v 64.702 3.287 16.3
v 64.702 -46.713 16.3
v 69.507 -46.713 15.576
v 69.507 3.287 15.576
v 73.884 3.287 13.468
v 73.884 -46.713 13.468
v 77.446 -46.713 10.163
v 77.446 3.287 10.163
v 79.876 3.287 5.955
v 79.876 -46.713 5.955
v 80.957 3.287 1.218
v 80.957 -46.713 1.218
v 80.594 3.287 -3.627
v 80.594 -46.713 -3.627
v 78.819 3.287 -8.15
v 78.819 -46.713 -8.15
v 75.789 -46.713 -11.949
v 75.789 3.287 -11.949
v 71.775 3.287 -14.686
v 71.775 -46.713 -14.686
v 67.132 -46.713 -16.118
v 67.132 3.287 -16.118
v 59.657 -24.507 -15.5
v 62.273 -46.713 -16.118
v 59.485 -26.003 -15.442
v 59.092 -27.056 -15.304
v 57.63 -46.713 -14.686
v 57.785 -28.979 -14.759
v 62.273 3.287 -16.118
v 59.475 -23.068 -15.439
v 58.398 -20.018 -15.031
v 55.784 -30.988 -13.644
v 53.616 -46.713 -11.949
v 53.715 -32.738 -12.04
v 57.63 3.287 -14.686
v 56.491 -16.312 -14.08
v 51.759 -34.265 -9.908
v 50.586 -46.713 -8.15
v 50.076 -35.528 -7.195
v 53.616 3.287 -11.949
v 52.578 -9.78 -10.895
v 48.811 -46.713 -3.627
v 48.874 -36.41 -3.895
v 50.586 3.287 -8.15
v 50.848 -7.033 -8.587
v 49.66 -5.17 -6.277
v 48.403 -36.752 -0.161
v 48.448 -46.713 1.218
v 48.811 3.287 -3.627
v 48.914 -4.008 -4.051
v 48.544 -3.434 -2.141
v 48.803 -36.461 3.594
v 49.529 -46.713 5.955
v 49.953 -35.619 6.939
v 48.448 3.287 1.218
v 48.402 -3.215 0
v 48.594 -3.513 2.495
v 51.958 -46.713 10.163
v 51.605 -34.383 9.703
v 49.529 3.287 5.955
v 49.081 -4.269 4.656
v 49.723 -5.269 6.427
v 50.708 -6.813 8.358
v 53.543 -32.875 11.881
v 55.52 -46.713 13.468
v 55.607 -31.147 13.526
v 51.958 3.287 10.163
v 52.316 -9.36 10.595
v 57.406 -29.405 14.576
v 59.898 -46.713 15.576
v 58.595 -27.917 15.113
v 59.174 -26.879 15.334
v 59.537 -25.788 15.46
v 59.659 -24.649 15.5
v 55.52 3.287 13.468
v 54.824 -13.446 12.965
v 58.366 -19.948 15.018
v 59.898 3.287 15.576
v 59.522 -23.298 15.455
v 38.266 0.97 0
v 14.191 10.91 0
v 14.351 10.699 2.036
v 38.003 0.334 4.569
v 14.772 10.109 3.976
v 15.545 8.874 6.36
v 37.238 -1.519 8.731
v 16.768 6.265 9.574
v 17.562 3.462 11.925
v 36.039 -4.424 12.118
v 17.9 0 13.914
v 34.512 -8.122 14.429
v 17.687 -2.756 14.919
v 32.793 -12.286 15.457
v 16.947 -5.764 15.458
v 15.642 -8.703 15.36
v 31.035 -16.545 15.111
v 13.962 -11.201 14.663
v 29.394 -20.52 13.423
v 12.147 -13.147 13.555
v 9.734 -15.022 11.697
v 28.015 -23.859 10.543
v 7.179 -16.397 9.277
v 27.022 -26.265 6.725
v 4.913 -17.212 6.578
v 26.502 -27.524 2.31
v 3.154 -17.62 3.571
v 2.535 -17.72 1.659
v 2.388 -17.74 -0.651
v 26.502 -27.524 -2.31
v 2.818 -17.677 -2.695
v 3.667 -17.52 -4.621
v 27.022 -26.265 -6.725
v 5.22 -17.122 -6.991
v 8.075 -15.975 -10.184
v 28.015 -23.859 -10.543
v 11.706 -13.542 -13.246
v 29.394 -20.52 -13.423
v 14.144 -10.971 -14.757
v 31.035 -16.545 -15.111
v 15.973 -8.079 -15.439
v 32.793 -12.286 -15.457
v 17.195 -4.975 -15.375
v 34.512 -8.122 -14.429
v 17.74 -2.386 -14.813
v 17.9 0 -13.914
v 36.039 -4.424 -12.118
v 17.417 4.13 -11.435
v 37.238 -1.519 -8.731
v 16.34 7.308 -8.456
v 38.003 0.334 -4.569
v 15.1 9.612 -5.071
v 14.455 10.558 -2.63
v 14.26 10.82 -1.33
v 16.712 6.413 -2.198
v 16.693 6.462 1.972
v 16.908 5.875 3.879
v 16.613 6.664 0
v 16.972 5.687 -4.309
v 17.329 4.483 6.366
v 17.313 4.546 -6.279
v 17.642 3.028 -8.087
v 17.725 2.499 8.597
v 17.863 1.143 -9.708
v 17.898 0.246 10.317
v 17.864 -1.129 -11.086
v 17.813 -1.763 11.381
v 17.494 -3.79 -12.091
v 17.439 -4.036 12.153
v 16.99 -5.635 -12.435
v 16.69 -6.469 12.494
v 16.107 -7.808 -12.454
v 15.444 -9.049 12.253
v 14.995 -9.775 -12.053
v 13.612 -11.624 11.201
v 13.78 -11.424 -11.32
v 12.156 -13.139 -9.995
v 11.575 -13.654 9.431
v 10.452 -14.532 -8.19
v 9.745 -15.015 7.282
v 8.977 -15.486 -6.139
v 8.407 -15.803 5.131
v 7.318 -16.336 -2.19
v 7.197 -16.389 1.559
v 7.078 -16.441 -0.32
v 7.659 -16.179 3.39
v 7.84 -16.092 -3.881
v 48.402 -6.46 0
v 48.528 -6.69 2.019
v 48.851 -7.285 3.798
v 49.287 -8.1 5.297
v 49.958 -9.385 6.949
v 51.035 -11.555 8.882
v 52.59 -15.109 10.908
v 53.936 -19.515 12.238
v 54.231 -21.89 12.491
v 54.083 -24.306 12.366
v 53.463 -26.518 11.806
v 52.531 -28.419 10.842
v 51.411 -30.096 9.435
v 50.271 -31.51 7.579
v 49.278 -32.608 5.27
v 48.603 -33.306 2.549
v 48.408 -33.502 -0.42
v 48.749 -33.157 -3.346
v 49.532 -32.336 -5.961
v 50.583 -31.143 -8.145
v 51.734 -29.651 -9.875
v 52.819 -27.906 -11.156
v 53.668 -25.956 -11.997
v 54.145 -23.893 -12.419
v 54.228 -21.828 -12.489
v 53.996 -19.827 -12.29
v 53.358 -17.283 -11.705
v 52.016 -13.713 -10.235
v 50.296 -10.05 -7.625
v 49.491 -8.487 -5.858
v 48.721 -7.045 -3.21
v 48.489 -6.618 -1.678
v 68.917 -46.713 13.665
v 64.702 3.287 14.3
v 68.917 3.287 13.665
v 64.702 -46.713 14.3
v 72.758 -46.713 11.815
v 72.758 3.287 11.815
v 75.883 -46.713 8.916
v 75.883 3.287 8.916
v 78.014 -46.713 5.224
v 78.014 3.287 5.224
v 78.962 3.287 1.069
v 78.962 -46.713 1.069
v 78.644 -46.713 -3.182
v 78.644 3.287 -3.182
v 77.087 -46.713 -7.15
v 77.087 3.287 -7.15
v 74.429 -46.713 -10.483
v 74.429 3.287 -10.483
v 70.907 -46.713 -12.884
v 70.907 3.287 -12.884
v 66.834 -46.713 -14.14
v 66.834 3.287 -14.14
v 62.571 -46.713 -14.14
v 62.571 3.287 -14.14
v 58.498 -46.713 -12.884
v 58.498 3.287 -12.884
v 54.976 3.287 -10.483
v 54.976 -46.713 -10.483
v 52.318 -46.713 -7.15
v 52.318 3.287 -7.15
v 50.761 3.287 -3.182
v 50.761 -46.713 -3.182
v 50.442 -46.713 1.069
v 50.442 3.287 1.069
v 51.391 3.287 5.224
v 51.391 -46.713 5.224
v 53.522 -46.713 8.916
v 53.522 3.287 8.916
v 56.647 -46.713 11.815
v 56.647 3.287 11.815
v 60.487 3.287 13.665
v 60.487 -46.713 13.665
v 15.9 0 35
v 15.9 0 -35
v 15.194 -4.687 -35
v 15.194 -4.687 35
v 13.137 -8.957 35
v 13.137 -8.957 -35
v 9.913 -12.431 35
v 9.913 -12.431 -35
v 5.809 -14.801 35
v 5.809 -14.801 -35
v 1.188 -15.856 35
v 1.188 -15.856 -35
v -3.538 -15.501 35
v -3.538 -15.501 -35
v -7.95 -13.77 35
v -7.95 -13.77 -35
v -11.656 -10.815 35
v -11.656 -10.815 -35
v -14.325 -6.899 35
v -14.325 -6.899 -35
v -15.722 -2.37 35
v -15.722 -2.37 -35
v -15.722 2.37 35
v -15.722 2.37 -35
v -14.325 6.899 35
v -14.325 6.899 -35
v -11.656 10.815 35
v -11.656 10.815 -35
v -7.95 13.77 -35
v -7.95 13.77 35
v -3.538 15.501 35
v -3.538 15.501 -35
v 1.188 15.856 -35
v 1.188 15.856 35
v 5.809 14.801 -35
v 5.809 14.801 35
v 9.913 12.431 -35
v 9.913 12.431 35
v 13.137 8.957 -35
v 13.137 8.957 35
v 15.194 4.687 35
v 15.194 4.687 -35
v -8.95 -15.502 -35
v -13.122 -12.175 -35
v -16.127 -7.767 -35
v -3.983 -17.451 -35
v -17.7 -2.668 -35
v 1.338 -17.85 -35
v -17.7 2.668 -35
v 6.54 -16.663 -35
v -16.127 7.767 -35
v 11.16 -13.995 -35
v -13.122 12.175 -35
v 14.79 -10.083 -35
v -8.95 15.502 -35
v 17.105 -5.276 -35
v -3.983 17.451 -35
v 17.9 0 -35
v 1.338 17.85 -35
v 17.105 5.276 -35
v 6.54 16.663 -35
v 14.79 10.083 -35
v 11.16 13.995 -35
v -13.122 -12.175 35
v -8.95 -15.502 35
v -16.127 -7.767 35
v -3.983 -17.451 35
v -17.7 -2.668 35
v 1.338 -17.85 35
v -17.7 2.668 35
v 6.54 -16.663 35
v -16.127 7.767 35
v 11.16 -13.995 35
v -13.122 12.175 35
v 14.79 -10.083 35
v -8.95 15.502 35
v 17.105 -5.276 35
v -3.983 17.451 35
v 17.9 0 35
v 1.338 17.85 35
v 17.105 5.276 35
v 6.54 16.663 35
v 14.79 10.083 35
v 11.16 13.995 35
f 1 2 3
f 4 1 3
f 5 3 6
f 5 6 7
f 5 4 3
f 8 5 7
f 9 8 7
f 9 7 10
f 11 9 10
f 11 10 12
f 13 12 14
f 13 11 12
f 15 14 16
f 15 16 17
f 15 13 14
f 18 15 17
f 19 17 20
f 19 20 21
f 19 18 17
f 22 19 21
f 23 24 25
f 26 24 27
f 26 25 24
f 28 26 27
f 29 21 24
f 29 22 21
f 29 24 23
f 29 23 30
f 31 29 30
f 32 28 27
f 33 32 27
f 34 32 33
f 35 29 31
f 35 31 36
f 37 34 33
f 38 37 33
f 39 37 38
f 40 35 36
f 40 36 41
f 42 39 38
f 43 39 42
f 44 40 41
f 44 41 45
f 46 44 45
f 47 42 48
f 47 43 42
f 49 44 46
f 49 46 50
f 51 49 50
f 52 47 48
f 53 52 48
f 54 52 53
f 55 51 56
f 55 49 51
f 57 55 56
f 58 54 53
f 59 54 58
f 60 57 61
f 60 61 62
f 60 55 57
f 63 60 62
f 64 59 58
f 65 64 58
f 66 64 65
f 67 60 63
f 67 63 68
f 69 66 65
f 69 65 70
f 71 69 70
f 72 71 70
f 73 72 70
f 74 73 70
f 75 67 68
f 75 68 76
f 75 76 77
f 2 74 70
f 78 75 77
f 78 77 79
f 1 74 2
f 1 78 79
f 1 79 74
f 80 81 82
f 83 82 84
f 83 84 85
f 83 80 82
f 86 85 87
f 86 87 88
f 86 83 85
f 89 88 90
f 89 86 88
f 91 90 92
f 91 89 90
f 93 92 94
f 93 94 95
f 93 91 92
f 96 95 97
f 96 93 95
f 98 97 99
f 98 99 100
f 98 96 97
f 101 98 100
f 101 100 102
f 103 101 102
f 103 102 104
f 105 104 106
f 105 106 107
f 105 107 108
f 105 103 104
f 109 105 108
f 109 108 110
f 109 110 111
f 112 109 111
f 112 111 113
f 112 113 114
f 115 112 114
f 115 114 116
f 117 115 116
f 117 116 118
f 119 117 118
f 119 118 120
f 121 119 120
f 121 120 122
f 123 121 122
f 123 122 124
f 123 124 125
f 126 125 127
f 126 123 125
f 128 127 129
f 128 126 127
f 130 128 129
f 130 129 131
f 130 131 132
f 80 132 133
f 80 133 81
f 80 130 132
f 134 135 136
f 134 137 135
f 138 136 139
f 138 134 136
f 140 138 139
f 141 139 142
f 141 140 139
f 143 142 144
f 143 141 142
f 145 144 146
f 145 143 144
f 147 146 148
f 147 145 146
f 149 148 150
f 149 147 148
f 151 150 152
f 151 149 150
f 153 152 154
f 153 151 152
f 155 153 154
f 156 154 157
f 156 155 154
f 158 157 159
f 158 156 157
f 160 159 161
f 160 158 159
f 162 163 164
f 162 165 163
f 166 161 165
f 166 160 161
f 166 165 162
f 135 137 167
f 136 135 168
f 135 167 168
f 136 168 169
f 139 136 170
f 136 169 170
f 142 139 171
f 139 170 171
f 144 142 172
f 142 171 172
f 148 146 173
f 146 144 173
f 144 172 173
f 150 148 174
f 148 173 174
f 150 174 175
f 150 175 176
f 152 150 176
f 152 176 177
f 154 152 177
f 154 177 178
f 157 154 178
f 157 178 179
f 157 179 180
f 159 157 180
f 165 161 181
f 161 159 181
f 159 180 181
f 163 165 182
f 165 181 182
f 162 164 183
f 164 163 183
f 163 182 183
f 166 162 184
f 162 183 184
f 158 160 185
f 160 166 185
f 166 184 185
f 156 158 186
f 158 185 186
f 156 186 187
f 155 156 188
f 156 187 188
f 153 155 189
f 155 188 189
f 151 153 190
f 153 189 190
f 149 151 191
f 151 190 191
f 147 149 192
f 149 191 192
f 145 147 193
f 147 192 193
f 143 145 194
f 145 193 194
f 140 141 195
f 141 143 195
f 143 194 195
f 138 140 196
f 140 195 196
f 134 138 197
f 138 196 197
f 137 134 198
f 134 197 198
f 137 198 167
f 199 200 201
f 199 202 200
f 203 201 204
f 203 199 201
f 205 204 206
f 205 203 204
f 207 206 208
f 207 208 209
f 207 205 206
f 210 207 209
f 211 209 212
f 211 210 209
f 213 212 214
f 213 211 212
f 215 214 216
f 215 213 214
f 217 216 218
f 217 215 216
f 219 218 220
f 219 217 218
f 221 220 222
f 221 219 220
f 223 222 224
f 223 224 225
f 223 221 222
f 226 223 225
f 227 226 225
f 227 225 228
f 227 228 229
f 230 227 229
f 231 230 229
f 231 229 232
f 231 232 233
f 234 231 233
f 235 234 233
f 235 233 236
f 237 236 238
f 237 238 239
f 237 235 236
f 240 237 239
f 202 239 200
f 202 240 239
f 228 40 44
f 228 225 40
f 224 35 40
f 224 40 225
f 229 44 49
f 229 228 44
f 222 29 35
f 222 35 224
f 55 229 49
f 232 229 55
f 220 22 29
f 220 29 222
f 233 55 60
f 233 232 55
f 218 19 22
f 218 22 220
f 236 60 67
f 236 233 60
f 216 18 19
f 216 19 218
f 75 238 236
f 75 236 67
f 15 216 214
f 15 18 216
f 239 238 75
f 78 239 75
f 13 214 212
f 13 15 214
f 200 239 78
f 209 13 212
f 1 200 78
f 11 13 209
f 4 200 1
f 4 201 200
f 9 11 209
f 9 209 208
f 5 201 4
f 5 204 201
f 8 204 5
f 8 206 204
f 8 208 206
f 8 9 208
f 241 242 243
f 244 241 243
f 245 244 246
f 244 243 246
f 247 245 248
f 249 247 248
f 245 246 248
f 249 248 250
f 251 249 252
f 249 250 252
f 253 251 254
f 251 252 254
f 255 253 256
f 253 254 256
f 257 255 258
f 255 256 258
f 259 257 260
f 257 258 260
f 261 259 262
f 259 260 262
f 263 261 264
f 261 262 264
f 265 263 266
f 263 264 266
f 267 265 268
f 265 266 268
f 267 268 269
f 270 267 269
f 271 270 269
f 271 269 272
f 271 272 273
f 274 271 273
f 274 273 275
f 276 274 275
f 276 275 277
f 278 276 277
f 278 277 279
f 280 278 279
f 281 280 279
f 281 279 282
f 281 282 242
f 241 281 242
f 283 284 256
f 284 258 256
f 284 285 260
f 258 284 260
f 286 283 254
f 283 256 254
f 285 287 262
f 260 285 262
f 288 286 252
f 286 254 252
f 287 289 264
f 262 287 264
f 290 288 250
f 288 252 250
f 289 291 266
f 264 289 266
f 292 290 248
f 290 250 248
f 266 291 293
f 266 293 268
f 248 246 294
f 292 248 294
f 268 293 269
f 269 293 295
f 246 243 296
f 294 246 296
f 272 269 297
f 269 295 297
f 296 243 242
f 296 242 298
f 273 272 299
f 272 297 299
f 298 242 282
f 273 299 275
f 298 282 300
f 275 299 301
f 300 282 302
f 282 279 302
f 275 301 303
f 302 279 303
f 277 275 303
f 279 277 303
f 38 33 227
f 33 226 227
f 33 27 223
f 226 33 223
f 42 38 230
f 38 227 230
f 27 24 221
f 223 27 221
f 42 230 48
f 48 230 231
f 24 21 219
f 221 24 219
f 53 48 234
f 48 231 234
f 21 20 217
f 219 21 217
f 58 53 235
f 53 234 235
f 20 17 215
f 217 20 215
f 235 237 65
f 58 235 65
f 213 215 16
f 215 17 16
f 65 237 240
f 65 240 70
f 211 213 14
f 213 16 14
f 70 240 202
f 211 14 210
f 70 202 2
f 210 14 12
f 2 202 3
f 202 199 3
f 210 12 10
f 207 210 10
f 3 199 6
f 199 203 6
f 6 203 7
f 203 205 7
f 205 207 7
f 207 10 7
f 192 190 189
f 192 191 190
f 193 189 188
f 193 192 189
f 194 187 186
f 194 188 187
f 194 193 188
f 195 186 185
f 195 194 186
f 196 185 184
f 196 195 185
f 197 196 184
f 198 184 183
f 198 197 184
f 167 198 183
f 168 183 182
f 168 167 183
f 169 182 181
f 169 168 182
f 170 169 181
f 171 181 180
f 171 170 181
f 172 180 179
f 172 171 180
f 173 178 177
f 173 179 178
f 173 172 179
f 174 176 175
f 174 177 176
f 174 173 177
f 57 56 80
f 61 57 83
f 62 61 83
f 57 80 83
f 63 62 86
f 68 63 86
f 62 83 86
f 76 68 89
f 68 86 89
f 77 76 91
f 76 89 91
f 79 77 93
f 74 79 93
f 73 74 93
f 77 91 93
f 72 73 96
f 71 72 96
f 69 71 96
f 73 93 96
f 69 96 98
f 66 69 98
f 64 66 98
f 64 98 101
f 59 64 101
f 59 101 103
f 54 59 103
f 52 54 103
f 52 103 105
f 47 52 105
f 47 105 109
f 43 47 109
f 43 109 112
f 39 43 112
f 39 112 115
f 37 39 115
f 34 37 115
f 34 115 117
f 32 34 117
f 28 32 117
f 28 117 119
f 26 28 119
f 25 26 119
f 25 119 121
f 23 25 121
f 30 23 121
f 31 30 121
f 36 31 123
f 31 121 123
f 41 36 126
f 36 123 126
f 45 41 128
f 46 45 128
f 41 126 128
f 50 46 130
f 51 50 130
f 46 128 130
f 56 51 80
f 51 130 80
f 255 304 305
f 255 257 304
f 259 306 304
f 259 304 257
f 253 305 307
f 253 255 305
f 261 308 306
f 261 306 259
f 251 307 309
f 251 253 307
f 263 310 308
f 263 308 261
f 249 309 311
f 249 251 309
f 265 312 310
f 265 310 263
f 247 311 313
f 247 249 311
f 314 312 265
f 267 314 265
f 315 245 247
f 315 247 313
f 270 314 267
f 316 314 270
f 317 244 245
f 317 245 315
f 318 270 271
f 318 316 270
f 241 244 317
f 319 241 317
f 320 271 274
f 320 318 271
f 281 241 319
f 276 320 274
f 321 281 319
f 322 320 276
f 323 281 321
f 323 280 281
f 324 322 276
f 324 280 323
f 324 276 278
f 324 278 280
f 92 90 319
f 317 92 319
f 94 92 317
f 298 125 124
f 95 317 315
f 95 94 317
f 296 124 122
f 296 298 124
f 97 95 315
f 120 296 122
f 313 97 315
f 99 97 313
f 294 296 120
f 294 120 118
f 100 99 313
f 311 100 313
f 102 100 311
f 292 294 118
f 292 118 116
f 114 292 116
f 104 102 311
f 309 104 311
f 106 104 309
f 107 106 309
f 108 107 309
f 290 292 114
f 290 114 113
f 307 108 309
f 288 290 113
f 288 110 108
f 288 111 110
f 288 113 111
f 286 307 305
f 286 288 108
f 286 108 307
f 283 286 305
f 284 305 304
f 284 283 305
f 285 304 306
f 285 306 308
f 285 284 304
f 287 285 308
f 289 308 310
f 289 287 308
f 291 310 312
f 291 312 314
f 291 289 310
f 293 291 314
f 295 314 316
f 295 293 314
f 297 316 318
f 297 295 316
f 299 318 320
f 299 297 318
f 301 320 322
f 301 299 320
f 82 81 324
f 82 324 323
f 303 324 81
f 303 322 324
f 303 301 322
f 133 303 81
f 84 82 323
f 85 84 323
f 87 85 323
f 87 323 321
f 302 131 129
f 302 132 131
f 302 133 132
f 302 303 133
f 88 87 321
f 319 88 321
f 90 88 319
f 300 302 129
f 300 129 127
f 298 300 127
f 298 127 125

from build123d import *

# Parameters (mm, degrees)
ESQUISSE1_R                         = 17.9
ESQUISSE1_R_2                       = 15.9
ESQUISSE5_R                         = 16.3
ESQUISSE5_R_2                       = 14.3
BOSS_EXTRU_1_DEPTH                  = 30
BOSS_EXTRU_1_DEPTH_BACK             = 20
BOSS_EXTRU_2_REACH                  = 71.734
BOSS_EXTRU_2_END_RADIUS             = 16.3
ESQUISSE8_R                         = 15.5
ESQUISSE8_R_2                       = 12.5
BOSS_EXTRU_2_DIRECTION_2_REACH      = 71.734
BOSS_EXTRU_2_DIRECTION_2_END_RADIUS = 17.9


with BuildPart() as part:
    # Balayage1: sweep along a path in Esquisse2
    with BuildLine(Plane(origin=(0, 0, 0), x_dir=(0, 0, -1), z_dir=(1, 0, 0))) as balayage1_path:
        Line((-35, 0), (35, 0))
    # Esquisse1 → Balayage1 (sweep)
    with BuildSketch(Plane.XY):
        Circle(ESQUISSE1_R)
        Circle(ESQUISSE1_R_2, mode=Mode.SUBTRACT)
    sweep(path=balayage1_path.line)



with BuildPart() as body_2:
    # Esquisse5 → Boss.-Extru.1 (new, two sides)
    with BuildSketch(Plane(origin=(0, -26.71342567, 0), x_dir=(1, 0, 0), z_dir=(0, 1, 0))) as boss_extru_1_sk:
        with Locations(Location((64.702340676, 0, 0), (0, 0, 270))):
            Circle(ESQUISSE5_R)
        with Locations(Location((64.702340676, 0, 0), (0, 0, 270))):
            Circle(ESQUISSE5_R_2, mode=Mode.SUBTRACT)
    extrude(amount=BOSS_EXTRU_1_DEPTH)
    extrude(boss_extru_1_sk.sketch, amount=-BOSS_EXTRU_1_DEPTH_BACK)


with BuildPart() as part_1:
    add(part.part)

    add(body_2.part)  # Boss.-Extru.2 merges body 2
    # Boss.-Extru.2: up to this cylinder (the profile starts outside it)
    boss_extru_2_end = Plane(origin=(64.702340676, -27.278432, 0), z_dir=(0, 1, 0)) * Cylinder(BOSS_EXTRU_2_END_RADIUS, 177.068, mode=Mode.PRIVATE)
    # Esquisse8 → Boss.-Extru.2 (add, up to the surface)
    with BuildSketch(Plane(origin=(32.351170338, -13.356712835, 0), x_dir=(0, 0, -1), z_dir=(0.9243191525163077, -0.381620366714795, 0)), mode=Mode.PRIVATE) as boss_extru_2_sk1:
        with Locations(Location((0, 0, 0), (0, 0, 90))):
            Circle(ESQUISSE8_R)
        with Locations(Location((0, 0, 0), (0, 0, 90))):
            Circle(ESQUISSE8_R_2, mode=Mode.SUBTRACT)
    boss_extru_2_tool1 = extrude(boss_extru_2_sk1.sketch, amount=BOSS_EXTRU_2_REACH, mode=Mode.PRIVATE) - boss_extru_2_end
    add(boss_extru_2_tool1.solids().sort_by_distance((26.603359, -27.278432, 0))[0])

    # Boss.-Extru.2 direction 2: up to this cylinder (the profile starts outside it)
    boss_extru_2_direction_2_end = Plane(origin=(0, 0, 0), z_dir=(0, 0, 1)) * Cylinder(BOSS_EXTRU_2_DIRECTION_2_END_RADIUS, 180.268, mode=Mode.PRIVATE)
    # Esquisse8 → Boss.-Extru.2 direction 2 (add, up to the surface)
    with BuildSketch(Plane(origin=(32.351170338, -13.356712835, 0), x_dir=(0, 0, -1), z_dir=(0.9243191525163077, -0.381620366714795, 0)), mode=Mode.PRIVATE) as boss_extru_2_direction_2_sk1:
        with Locations(Location((0, 0, 0), (0, 0, 90))):
            Circle(ESQUISSE8_R)
        with Locations(Location((0, 0, 0), (0, 0, 90))):
            Circle(ESQUISSE8_R_2, mode=Mode.SUBTRACT)
    boss_extru_2_direction_2_tool1 = extrude(boss_extru_2_direction_2_sk1.sketch, amount=-BOSS_EXTRU_2_DIRECTION_2_REACH, mode=Mode.PRIVATE) - boss_extru_2_direction_2_end
    add(boss_extru_2_direction_2_tool1.solids().sort_by_distance((26.603359, -27.278432, 0))[0])


solid = part_1.part
